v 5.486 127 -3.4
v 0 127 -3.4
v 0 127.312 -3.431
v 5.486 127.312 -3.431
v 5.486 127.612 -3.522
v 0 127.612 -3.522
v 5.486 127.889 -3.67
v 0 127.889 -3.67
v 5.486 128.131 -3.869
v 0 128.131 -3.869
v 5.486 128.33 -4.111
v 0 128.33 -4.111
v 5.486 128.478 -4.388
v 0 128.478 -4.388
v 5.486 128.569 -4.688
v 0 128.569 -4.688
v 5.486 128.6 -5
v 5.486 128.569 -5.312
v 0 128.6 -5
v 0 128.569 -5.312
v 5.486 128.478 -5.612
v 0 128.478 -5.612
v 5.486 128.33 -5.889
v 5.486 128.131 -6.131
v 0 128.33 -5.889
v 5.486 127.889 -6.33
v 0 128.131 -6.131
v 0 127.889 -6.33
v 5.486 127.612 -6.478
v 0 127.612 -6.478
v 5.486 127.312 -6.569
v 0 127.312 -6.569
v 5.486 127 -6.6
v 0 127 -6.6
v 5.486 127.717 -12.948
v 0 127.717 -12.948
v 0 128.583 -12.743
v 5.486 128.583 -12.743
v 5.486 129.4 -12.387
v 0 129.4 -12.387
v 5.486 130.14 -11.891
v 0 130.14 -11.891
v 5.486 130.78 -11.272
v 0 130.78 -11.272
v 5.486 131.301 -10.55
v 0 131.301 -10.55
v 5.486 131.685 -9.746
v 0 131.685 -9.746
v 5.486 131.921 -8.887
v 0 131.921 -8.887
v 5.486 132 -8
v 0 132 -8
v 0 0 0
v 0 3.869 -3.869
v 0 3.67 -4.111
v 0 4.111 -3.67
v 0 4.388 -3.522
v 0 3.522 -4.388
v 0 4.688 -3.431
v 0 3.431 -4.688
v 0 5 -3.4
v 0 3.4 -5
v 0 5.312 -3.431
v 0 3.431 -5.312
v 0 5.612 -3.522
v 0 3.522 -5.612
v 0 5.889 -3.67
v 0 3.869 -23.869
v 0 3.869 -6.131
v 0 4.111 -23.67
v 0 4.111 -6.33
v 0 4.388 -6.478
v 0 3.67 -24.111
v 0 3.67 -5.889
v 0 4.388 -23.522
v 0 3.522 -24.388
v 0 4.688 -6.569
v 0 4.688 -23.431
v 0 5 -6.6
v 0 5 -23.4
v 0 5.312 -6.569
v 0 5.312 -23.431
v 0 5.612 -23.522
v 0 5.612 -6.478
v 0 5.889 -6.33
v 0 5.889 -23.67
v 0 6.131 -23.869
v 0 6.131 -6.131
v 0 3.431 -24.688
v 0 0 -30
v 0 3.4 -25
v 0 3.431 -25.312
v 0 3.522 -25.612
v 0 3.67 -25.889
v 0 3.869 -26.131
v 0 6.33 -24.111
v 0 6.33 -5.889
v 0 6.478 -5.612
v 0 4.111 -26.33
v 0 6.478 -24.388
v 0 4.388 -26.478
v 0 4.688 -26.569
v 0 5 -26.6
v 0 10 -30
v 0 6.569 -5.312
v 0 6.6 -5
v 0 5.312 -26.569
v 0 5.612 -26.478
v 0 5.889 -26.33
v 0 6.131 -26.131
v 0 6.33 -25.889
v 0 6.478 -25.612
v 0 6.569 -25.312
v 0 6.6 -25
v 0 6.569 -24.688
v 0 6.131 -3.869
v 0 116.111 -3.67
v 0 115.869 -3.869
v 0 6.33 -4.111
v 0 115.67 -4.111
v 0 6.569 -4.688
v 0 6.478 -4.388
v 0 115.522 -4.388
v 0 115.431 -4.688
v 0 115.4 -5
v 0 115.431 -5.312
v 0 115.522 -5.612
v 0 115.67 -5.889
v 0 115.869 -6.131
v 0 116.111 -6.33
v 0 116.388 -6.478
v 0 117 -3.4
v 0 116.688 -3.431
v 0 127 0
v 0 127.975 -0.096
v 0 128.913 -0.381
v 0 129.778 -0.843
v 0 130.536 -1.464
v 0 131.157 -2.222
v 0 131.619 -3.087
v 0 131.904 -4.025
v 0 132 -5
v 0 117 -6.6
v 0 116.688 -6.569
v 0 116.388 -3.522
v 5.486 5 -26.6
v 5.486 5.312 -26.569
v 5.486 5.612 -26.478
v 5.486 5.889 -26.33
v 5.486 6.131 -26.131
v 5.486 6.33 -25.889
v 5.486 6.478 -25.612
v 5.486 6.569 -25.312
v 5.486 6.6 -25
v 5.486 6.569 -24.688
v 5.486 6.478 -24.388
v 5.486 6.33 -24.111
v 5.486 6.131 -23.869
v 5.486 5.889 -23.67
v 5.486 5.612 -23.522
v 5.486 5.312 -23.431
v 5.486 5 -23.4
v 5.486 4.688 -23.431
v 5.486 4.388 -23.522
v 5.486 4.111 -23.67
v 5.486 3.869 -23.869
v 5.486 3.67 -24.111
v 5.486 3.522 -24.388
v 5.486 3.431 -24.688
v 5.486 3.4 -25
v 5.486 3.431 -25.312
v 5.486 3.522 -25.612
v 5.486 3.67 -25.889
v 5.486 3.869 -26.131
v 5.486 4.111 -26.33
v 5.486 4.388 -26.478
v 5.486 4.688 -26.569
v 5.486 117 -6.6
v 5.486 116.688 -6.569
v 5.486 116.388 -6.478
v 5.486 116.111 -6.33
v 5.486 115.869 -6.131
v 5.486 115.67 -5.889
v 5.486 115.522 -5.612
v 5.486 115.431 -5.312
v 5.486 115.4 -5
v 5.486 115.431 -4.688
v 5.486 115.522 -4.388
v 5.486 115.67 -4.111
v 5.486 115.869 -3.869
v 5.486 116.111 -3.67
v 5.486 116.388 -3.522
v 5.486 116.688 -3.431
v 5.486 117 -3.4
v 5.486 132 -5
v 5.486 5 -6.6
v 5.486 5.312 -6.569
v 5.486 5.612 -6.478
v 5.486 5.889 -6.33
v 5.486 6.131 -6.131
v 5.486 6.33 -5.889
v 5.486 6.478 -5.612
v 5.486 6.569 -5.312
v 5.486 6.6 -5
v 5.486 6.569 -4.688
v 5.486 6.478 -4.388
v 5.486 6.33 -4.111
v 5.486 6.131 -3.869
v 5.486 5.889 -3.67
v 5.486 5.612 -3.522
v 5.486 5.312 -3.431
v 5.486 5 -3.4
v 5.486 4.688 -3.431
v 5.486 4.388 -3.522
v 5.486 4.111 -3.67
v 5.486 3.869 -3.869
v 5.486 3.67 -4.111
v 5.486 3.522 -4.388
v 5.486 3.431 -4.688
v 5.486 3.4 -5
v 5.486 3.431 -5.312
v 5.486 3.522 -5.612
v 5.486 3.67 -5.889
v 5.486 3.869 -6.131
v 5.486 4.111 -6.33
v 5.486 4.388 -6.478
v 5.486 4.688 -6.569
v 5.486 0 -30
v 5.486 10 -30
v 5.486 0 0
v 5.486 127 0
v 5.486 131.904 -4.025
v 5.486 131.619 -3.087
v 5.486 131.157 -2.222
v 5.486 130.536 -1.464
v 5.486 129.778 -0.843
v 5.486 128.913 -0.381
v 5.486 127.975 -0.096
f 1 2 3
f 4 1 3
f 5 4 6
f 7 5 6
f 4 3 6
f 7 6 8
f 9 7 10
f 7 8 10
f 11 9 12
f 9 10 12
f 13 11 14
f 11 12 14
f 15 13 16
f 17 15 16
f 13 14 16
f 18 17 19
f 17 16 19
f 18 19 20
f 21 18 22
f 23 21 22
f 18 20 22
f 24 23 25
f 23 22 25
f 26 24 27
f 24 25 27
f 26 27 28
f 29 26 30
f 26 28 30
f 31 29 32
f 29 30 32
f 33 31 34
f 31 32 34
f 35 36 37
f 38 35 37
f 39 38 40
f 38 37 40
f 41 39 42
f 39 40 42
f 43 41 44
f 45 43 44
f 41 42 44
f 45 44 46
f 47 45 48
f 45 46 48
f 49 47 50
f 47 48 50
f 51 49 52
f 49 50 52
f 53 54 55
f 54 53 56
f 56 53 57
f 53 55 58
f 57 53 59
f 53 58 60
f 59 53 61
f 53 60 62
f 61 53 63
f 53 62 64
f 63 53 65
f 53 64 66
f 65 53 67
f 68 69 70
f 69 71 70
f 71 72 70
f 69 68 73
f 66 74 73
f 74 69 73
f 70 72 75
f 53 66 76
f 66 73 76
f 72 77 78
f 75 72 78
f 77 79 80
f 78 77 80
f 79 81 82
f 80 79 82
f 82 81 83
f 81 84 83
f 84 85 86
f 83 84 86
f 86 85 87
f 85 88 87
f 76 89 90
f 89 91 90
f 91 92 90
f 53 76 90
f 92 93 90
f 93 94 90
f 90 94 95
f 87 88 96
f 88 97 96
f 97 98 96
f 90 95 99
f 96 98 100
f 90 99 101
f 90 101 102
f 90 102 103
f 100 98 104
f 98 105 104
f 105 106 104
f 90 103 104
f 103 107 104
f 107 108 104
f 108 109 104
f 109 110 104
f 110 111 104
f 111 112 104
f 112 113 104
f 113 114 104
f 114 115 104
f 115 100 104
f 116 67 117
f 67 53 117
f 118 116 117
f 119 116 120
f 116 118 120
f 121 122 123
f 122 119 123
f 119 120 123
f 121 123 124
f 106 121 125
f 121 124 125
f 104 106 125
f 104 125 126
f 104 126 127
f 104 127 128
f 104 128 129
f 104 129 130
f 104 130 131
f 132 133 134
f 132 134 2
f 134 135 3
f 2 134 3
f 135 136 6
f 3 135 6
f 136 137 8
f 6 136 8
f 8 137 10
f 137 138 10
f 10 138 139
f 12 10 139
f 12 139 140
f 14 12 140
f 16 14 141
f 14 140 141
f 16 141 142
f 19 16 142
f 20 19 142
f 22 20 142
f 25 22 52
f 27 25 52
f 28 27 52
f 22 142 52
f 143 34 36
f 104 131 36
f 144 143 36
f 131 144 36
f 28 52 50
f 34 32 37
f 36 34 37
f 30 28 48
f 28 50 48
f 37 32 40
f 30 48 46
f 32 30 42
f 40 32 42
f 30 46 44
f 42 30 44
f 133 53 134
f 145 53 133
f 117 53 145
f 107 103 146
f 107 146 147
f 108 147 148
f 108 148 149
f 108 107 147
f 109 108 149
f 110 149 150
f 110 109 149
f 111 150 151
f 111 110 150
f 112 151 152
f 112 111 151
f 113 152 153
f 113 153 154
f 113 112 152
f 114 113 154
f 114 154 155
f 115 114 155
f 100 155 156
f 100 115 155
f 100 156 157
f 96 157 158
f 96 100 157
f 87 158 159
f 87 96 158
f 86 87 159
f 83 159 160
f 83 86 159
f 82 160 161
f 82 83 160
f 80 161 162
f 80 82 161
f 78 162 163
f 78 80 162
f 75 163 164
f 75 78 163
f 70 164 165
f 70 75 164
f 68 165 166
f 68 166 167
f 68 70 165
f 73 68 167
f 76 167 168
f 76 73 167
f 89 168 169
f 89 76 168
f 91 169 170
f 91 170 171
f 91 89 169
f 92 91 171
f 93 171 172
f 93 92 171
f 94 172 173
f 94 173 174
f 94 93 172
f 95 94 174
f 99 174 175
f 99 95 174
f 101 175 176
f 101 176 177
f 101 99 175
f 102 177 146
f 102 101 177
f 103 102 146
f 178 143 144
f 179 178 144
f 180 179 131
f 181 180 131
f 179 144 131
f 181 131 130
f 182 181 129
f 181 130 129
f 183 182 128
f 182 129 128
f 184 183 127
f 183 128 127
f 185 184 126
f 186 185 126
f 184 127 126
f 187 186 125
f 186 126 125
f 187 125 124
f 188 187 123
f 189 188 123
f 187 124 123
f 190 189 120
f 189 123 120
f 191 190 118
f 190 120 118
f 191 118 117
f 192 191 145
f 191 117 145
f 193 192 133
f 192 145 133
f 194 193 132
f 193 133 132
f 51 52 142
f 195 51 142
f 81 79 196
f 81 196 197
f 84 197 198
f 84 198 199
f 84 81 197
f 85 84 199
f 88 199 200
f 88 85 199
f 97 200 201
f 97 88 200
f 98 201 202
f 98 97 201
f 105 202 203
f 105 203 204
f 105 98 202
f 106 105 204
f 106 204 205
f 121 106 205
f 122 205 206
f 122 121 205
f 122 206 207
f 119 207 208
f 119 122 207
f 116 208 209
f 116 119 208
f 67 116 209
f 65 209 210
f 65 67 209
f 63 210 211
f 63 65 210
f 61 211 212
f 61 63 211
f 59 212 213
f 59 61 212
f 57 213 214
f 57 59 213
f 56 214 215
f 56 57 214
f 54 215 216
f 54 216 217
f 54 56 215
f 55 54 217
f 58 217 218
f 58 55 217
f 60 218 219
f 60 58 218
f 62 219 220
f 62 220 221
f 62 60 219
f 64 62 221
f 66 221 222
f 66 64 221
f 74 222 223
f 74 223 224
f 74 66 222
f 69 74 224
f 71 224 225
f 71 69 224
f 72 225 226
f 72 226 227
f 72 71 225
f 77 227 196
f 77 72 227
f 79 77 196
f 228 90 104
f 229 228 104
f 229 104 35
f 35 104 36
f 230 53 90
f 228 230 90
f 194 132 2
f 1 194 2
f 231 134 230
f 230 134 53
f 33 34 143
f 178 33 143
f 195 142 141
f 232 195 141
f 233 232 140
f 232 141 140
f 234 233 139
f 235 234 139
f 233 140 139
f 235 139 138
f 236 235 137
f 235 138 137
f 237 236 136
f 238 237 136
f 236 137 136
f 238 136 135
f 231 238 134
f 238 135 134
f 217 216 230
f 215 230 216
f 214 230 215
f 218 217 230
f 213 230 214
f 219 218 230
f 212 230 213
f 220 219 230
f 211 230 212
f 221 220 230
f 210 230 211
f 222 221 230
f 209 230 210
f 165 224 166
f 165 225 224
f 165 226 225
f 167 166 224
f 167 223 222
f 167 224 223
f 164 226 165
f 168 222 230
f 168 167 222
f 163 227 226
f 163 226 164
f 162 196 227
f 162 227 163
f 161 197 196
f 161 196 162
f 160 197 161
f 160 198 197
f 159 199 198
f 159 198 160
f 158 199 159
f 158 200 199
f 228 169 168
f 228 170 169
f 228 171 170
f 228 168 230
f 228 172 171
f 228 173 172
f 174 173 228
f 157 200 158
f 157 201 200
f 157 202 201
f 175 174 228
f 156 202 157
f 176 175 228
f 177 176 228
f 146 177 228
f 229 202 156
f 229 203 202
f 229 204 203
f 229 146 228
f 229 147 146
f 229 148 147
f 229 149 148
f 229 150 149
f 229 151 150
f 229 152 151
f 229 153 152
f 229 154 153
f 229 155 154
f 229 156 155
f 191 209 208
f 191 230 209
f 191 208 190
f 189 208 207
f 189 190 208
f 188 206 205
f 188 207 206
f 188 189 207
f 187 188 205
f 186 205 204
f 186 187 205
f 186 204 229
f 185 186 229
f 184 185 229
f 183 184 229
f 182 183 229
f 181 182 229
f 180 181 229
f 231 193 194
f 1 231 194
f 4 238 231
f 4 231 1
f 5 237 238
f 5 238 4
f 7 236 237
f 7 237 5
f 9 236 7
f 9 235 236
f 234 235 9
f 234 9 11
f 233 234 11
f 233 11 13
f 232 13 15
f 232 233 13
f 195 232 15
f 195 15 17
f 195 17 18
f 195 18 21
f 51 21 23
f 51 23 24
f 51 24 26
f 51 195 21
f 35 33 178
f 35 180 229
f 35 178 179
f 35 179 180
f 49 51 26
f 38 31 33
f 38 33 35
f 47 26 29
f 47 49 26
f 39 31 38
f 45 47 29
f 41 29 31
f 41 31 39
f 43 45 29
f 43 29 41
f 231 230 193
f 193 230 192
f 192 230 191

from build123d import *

# Parameters (mm, degrees)
SKETCH1_R           = 1.6
BOSS_EXTRUDE1_DEPTH = 5.4864


with BuildPart() as part:
    # Sketch1 → Boss-Extrude1 (new body)
    with BuildSketch(Plane(origin=(0, 0, 0), x_dir=(0, 0, -1), z_dir=(1, 0, 0))):
        with BuildLine():
            Line((0, 0), (30, 0))
            Line((30, 0), (30, 10))
            Line((30, 10), (12.948355245, 127.716784747))
            ThreePointArc((12.948355245, 127.716784747), (11.272313881, 130.780471117), (8, 132))
            Line((8, 132), (5, 132))
            ThreePointArc((5, 132), (1.464466094, 130.535533906), (0, 127))
            Line((0, 127), (0, 0))
        make_face()
        with Locations((5, 5)):
            Circle(SKETCH1_R, mode=Mode.SUBTRACT)
        with Locations((25, 5)):
            Circle(SKETCH1_R, mode=Mode.SUBTRACT)
        with BuildLine():
            Line((3.4, 117), (3.4, 127))
            ThreePointArc((3.4, 127), (5, 128.6), (6.6, 127))
            Line((6.6, 127), (6.6, 117))
            ThreePointArc((6.6, 117), (5, 115.4), (3.4, 117))
        make_face(mode=Mode.SUBTRACT)
    extrude(amount=BOSS_EXTRUDE1_DEPTH)


solid = part.part
